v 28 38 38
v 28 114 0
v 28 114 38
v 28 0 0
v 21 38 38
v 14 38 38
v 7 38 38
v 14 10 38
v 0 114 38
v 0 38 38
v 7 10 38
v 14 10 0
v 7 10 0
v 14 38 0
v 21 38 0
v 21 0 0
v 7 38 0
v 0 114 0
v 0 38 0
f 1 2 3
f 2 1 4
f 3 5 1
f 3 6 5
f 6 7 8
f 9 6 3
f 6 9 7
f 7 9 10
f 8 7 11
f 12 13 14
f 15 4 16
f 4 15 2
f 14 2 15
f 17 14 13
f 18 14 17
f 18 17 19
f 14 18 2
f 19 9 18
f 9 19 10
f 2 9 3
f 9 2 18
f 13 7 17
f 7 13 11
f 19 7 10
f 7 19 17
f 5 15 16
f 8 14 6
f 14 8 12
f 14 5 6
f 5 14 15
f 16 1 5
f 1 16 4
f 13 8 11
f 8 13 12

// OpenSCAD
difference(){
    difference(){
  difference(){
     difference(){
 cube([28,114,38]);
  cube([7,38,38]);
                 }
translate([14,0,0])
cube([7,38,38]);
            }
  rotate([45,0,0])
   translate([21,0,0])
            cube([7,54,30]);
        }
  translate([7,0,0])
        cube([7,10,38]);
    }
